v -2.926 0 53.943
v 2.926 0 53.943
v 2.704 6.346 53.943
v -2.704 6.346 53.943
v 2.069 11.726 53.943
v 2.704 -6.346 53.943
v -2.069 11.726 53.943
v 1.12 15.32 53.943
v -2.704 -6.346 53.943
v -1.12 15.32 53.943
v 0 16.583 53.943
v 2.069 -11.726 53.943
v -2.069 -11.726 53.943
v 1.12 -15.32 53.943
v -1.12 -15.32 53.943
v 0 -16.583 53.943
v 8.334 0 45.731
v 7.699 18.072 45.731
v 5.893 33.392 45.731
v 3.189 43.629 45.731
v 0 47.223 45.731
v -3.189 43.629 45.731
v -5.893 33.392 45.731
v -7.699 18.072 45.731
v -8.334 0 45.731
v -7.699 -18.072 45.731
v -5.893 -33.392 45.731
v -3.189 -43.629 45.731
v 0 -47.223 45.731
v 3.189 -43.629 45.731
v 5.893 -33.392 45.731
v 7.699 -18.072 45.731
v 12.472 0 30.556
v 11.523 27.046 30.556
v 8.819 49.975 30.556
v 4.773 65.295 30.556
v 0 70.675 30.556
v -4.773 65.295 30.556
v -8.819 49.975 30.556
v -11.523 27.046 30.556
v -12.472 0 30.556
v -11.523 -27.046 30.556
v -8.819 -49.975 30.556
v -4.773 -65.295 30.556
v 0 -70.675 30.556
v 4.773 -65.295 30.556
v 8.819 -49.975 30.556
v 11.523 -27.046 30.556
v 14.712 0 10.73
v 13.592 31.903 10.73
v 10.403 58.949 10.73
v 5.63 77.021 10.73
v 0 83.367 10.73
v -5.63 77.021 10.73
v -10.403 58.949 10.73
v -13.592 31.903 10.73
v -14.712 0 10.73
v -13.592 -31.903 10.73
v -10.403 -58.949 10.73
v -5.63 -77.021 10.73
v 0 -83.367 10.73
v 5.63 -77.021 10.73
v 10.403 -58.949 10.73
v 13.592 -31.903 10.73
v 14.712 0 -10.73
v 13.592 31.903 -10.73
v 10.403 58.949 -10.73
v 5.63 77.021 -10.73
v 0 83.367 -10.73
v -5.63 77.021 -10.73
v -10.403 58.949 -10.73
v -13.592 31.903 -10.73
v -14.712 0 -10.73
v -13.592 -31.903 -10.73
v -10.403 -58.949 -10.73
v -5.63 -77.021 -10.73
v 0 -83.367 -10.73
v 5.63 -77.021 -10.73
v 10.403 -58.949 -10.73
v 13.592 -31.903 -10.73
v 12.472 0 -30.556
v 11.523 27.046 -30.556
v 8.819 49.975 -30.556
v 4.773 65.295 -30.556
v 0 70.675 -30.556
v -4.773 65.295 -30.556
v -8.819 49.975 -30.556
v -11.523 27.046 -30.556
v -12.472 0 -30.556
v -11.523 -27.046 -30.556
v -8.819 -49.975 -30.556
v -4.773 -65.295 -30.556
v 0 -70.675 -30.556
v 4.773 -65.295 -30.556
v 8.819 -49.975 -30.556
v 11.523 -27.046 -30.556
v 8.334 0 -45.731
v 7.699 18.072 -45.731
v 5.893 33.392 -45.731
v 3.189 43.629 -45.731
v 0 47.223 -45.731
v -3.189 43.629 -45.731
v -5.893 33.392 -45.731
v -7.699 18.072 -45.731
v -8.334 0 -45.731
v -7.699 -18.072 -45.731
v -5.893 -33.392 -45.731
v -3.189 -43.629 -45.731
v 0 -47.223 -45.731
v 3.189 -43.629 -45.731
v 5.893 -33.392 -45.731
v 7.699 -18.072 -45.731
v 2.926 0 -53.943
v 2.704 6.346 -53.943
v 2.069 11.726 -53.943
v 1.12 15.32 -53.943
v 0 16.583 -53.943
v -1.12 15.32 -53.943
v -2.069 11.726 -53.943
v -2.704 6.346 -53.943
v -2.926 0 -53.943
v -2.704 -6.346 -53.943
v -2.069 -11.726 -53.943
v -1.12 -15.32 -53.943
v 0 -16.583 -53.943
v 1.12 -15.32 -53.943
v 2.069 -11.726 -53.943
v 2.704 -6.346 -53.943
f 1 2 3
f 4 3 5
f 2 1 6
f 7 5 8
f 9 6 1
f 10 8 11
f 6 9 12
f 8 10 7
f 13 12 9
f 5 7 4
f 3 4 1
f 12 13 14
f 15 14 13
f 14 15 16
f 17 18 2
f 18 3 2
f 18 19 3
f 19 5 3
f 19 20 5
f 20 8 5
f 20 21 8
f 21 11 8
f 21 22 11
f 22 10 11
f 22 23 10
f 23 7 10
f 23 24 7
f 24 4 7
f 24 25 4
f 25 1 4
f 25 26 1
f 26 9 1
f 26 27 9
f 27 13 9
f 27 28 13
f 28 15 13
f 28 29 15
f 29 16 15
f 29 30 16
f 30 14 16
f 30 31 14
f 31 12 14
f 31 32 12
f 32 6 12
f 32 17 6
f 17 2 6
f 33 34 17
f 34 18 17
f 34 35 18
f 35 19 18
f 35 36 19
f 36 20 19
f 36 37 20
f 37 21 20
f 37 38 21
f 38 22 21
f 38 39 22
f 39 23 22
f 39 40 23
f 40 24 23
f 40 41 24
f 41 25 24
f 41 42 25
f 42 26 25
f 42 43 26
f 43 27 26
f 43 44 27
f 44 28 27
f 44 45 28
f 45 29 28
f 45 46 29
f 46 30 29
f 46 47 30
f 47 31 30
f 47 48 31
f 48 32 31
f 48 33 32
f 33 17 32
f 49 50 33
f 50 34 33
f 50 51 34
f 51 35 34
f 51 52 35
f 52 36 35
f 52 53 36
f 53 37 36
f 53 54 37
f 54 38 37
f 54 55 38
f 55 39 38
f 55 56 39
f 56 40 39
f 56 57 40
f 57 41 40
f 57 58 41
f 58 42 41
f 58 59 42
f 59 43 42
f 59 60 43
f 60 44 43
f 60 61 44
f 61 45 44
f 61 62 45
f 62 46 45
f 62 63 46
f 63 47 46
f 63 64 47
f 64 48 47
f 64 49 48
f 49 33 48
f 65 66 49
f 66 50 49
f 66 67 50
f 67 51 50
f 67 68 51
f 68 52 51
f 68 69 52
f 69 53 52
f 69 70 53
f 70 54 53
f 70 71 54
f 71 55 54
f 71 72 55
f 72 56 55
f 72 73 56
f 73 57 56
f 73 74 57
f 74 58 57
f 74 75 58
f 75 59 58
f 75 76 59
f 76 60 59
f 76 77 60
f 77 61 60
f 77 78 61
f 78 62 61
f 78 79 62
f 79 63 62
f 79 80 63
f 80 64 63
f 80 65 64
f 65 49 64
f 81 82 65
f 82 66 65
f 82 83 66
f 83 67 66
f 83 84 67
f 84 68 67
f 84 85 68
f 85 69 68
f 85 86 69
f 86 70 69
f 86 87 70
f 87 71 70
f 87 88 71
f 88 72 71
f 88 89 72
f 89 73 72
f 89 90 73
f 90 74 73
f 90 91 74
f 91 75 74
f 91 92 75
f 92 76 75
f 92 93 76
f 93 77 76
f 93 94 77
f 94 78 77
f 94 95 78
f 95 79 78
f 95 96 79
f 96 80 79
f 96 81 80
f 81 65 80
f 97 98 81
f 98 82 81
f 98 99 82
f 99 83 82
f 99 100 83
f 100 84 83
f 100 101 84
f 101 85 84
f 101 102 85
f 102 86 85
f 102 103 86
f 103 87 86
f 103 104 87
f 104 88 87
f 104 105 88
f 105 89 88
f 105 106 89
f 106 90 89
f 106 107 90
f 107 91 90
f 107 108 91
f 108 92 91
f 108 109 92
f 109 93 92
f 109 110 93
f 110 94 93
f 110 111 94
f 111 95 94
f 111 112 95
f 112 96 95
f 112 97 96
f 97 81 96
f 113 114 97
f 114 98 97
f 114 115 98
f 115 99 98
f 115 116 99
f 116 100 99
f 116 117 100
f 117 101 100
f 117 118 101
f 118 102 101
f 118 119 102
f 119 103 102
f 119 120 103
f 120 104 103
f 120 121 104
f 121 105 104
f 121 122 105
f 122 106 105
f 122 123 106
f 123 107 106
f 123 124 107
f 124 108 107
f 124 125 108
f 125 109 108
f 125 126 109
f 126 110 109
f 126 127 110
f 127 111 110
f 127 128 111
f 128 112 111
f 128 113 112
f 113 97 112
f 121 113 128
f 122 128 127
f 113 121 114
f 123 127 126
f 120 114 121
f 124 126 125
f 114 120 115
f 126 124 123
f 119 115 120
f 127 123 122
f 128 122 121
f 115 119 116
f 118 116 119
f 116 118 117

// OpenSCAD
// Generated by SolidPython 1.0.1 on 2020-07-29 00:46:46


scale(v = [3, 17, 11]) {
	sphere(r = 5);
}
/***********************************************
*********      SolidPython code:      **********
************************************************
 
# import packages: SolidPython
from solid import *
from solid.utils import *
from itertools import chain, combinations, permutations


class Resize:

    def __init__(self, scad_file):
        self.scad_file = scad_file
        #self.scad_file = import_scad(scad_file)
        # cone/cylinder param:
        self.r1 = 0
        self.r2 = 0
        self.h = 0
        # rectangular prism param:
        self.w = 0
        self.l = 0
        # ellipse param:
        self.r = 0

    # import OpenScad code (file name corresponds to shape)


    # classify shape + parameters
    def assign(self, param1, param2, param3):
        if self.scad_file == 'cone.scad':
            self.r1 = param1
            self.r2 = param2
            self.h = param3
        elif self.scad_file == 'cylinder.scad':
            self.r1 = param1
            self.r2 = param2
            self.h = param3
        elif self.scad_file == 'rectangularPrism.scad':
            self.h = param1
            self.l = param2
            self.w = param3
        else:
            self.r = param1
            self.h = param2

    # resize parameters
    def iterate(self):
        x = range(3, 20, 2)
        i = 1
        if self.scad_file == 'cone.scad':
            tempList = list(permutations(x, 2))
            for temp in tempList:
                param1 = temp[0]
                param2 = temp[1]
                filepath = 'produced_scad_files/' + 'cone' + str(param1) + '_' + str(param2) + '_' + '.scad'
                scad_render_to_file(cylinder(h=param1, r1=param2, r2=0), filepath)

        elif self.scad_file == 'cylinder.scad':
            tempList = list(permutations(x, 3))
            for temp in tempList:
                param1 = temp[0]
                param2 = temp[1]
                filepath = 'produced_scad_files/' + 'cylinder' + str(param1) + '_' + str(param2) + '_' + '.scad'
                scad_render_to_file(cylinder(h=param1, r1=param2, r2=param2), filepath)

        elif self.scad_file == 'rectangularPrism.scad':
            tempList = list(permutations(x, 3))
            for temp in tempList:
                param1 = temp[0]
                param2 = temp[1]
                param3 = temp[2]
                filepath = 'produced_scad_files/' + 'rectangularPrism' + str(param1) + '_' + str(param2) + '_' + str(
                    param3) + '.scad'
                scad_render_to_file(cube(size=(param1, param2, param3)), filepath)

        elif self.scad_file == 'ellipse.scad':
            tempList = list(permutations(x, 4))
            for temp in tempList:
                param1 = temp[0]
                param2 = temp[1]
                param3 = temp[2]
                param4 = temp[3]
                filepath = 'produced_scad_files/' + 'ellipse' + str(param1) + '_' + str(param2) + '_' + str(param3) + '_' + str(param4) + '.scad'
                scad_render_to_file(scale([param1, param2, param3])(sphere(r=param4)), filepath)

    def render_to_scadfile(self):
        scad_render_to_file(scad, 'example.scad') 
 
************************************************/
